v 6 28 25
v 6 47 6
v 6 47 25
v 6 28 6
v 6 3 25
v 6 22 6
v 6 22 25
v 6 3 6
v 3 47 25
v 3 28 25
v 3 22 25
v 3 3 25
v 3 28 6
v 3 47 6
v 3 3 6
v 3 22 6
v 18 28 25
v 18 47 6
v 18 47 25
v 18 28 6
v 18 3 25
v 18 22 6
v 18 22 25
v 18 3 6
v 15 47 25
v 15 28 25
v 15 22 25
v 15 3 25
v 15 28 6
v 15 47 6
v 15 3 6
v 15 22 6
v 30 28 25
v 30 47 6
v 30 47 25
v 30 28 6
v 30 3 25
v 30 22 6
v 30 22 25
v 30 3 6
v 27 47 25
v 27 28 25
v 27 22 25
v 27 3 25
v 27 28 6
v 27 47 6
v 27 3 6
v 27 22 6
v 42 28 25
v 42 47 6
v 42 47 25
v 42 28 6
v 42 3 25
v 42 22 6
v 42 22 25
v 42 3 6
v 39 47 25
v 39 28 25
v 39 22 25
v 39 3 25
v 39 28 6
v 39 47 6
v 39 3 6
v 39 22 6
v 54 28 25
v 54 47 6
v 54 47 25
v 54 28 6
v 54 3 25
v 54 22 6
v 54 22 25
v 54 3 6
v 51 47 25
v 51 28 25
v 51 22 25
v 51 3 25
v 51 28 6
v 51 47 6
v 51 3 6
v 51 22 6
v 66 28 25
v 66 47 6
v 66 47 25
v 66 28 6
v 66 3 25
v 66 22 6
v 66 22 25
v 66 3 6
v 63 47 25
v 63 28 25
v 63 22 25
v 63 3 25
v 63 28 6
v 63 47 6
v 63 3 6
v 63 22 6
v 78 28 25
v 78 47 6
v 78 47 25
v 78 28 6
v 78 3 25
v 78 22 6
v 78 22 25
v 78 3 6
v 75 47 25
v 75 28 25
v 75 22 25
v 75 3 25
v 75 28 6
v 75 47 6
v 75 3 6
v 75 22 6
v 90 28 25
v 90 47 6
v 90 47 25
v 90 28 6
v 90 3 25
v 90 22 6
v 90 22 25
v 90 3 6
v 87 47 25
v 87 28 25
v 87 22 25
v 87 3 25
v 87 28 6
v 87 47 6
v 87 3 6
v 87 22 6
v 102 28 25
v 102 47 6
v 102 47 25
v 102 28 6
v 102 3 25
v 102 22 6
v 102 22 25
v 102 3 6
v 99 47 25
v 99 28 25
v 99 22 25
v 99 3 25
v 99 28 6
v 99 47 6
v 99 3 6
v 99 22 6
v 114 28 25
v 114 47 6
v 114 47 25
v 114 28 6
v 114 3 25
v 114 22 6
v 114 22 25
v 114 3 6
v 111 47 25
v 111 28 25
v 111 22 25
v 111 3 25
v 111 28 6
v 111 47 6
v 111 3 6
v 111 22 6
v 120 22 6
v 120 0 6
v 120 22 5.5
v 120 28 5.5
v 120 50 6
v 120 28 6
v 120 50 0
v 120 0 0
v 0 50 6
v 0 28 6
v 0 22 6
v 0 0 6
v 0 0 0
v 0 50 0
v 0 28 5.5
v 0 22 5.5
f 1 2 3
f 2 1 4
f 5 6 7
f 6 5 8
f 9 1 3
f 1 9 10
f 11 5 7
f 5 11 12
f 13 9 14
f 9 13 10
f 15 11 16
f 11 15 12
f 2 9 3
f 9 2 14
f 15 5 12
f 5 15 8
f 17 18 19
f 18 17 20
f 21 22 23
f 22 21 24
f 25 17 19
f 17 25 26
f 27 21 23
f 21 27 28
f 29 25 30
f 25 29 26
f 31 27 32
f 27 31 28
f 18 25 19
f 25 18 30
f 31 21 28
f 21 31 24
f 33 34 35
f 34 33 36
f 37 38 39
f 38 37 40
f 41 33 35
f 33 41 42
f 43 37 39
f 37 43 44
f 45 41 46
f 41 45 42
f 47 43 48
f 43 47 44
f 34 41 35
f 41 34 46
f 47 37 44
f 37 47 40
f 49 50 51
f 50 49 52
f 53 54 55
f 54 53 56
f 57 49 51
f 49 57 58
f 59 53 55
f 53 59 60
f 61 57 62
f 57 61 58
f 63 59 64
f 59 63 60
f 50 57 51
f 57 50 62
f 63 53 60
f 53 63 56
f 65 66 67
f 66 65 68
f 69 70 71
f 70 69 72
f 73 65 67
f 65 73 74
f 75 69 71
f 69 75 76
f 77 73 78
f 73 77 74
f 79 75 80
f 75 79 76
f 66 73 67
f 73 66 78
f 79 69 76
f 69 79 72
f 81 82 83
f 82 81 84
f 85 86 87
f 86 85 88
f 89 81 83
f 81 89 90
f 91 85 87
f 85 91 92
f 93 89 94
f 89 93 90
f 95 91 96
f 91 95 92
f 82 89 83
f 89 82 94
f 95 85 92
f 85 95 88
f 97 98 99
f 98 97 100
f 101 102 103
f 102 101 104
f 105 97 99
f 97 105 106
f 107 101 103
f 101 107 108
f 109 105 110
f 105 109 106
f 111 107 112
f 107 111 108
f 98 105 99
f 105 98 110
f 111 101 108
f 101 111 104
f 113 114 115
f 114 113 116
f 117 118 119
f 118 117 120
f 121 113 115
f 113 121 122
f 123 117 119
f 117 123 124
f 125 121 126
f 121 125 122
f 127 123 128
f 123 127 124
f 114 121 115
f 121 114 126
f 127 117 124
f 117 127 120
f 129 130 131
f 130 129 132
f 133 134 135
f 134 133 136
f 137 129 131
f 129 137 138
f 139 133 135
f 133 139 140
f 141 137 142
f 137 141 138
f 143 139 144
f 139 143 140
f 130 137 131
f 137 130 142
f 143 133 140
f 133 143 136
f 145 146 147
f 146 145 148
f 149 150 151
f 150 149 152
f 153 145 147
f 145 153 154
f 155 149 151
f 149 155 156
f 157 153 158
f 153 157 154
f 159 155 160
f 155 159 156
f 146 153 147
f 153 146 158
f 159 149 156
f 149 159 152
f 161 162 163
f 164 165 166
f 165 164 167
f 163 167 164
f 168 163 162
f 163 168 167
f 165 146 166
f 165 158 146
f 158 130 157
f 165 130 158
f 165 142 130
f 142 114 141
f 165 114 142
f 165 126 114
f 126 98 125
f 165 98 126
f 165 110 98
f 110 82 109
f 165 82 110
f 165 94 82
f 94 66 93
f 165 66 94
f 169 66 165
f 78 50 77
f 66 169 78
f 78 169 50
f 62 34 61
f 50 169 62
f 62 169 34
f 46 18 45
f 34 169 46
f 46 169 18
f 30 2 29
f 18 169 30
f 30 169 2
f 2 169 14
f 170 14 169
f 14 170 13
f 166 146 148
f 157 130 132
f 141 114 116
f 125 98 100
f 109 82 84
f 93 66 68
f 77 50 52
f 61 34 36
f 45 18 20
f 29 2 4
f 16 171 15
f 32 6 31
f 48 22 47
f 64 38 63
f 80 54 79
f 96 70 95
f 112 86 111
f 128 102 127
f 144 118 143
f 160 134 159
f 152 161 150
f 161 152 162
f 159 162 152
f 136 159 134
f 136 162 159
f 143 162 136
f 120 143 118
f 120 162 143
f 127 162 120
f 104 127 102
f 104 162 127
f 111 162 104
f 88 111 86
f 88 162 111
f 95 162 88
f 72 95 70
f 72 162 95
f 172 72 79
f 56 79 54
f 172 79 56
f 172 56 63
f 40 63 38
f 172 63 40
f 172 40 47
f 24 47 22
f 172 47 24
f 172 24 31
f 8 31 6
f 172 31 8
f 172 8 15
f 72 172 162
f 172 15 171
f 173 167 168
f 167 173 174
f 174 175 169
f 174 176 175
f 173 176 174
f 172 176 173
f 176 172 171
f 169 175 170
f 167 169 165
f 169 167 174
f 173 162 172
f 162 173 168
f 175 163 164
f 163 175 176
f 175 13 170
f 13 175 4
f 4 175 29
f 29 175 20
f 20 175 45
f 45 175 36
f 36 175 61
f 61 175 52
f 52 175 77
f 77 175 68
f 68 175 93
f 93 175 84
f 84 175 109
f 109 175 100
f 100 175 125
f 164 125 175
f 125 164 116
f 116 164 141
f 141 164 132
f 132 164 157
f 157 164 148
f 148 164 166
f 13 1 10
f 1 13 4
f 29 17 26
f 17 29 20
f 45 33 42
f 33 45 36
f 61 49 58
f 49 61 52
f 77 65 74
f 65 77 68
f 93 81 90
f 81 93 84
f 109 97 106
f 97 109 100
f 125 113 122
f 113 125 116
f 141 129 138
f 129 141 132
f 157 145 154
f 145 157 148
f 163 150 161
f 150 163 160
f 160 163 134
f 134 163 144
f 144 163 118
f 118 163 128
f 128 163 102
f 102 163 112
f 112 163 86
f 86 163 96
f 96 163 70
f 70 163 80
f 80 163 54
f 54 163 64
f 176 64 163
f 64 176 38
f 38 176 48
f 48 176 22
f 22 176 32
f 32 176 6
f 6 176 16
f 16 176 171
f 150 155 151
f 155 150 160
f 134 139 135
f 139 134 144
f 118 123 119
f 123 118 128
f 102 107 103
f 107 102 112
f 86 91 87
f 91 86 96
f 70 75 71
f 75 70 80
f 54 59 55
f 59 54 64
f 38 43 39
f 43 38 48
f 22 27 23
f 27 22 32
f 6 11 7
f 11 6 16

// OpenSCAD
$fn = 32;

// ----------------------------------------------------------------------
// Heatsink: slotted fin block
// ----------------------------------------------------------------------

// --- parameters (mm) ---
base_l = 120;             // base length, X
base_w = 50;              // base width, Y
base_t = 6;               // base plate thickness
fin_h = 20;               // fin height above the base
fin_t = 3;                // fin thickness
edge = 3;                 // margin from the base ends
pitch = 12;               // fin pitch
slot_w = 6;               // central slot width, Y

n_fins = floor((base_l - 2 * edge - fin_t) / pitch) + 1;  // fin count
total_h = base_t + fin_h - 1;  // overall height

difference() {
union() {
  cube([base_l, base_w, base_t]);
  for (i = [0 : n_fins - 1])
    translate([edge + i * pitch, edge, base_t - 1])
      cube([fin_t, base_w - 2 * edge, fin_h]);
}
  translate([-1, base_w / 2 - slot_w / 2, base_t - 0.5])
    cube([base_l + 2, slot_w, fin_h + 2]);
}
